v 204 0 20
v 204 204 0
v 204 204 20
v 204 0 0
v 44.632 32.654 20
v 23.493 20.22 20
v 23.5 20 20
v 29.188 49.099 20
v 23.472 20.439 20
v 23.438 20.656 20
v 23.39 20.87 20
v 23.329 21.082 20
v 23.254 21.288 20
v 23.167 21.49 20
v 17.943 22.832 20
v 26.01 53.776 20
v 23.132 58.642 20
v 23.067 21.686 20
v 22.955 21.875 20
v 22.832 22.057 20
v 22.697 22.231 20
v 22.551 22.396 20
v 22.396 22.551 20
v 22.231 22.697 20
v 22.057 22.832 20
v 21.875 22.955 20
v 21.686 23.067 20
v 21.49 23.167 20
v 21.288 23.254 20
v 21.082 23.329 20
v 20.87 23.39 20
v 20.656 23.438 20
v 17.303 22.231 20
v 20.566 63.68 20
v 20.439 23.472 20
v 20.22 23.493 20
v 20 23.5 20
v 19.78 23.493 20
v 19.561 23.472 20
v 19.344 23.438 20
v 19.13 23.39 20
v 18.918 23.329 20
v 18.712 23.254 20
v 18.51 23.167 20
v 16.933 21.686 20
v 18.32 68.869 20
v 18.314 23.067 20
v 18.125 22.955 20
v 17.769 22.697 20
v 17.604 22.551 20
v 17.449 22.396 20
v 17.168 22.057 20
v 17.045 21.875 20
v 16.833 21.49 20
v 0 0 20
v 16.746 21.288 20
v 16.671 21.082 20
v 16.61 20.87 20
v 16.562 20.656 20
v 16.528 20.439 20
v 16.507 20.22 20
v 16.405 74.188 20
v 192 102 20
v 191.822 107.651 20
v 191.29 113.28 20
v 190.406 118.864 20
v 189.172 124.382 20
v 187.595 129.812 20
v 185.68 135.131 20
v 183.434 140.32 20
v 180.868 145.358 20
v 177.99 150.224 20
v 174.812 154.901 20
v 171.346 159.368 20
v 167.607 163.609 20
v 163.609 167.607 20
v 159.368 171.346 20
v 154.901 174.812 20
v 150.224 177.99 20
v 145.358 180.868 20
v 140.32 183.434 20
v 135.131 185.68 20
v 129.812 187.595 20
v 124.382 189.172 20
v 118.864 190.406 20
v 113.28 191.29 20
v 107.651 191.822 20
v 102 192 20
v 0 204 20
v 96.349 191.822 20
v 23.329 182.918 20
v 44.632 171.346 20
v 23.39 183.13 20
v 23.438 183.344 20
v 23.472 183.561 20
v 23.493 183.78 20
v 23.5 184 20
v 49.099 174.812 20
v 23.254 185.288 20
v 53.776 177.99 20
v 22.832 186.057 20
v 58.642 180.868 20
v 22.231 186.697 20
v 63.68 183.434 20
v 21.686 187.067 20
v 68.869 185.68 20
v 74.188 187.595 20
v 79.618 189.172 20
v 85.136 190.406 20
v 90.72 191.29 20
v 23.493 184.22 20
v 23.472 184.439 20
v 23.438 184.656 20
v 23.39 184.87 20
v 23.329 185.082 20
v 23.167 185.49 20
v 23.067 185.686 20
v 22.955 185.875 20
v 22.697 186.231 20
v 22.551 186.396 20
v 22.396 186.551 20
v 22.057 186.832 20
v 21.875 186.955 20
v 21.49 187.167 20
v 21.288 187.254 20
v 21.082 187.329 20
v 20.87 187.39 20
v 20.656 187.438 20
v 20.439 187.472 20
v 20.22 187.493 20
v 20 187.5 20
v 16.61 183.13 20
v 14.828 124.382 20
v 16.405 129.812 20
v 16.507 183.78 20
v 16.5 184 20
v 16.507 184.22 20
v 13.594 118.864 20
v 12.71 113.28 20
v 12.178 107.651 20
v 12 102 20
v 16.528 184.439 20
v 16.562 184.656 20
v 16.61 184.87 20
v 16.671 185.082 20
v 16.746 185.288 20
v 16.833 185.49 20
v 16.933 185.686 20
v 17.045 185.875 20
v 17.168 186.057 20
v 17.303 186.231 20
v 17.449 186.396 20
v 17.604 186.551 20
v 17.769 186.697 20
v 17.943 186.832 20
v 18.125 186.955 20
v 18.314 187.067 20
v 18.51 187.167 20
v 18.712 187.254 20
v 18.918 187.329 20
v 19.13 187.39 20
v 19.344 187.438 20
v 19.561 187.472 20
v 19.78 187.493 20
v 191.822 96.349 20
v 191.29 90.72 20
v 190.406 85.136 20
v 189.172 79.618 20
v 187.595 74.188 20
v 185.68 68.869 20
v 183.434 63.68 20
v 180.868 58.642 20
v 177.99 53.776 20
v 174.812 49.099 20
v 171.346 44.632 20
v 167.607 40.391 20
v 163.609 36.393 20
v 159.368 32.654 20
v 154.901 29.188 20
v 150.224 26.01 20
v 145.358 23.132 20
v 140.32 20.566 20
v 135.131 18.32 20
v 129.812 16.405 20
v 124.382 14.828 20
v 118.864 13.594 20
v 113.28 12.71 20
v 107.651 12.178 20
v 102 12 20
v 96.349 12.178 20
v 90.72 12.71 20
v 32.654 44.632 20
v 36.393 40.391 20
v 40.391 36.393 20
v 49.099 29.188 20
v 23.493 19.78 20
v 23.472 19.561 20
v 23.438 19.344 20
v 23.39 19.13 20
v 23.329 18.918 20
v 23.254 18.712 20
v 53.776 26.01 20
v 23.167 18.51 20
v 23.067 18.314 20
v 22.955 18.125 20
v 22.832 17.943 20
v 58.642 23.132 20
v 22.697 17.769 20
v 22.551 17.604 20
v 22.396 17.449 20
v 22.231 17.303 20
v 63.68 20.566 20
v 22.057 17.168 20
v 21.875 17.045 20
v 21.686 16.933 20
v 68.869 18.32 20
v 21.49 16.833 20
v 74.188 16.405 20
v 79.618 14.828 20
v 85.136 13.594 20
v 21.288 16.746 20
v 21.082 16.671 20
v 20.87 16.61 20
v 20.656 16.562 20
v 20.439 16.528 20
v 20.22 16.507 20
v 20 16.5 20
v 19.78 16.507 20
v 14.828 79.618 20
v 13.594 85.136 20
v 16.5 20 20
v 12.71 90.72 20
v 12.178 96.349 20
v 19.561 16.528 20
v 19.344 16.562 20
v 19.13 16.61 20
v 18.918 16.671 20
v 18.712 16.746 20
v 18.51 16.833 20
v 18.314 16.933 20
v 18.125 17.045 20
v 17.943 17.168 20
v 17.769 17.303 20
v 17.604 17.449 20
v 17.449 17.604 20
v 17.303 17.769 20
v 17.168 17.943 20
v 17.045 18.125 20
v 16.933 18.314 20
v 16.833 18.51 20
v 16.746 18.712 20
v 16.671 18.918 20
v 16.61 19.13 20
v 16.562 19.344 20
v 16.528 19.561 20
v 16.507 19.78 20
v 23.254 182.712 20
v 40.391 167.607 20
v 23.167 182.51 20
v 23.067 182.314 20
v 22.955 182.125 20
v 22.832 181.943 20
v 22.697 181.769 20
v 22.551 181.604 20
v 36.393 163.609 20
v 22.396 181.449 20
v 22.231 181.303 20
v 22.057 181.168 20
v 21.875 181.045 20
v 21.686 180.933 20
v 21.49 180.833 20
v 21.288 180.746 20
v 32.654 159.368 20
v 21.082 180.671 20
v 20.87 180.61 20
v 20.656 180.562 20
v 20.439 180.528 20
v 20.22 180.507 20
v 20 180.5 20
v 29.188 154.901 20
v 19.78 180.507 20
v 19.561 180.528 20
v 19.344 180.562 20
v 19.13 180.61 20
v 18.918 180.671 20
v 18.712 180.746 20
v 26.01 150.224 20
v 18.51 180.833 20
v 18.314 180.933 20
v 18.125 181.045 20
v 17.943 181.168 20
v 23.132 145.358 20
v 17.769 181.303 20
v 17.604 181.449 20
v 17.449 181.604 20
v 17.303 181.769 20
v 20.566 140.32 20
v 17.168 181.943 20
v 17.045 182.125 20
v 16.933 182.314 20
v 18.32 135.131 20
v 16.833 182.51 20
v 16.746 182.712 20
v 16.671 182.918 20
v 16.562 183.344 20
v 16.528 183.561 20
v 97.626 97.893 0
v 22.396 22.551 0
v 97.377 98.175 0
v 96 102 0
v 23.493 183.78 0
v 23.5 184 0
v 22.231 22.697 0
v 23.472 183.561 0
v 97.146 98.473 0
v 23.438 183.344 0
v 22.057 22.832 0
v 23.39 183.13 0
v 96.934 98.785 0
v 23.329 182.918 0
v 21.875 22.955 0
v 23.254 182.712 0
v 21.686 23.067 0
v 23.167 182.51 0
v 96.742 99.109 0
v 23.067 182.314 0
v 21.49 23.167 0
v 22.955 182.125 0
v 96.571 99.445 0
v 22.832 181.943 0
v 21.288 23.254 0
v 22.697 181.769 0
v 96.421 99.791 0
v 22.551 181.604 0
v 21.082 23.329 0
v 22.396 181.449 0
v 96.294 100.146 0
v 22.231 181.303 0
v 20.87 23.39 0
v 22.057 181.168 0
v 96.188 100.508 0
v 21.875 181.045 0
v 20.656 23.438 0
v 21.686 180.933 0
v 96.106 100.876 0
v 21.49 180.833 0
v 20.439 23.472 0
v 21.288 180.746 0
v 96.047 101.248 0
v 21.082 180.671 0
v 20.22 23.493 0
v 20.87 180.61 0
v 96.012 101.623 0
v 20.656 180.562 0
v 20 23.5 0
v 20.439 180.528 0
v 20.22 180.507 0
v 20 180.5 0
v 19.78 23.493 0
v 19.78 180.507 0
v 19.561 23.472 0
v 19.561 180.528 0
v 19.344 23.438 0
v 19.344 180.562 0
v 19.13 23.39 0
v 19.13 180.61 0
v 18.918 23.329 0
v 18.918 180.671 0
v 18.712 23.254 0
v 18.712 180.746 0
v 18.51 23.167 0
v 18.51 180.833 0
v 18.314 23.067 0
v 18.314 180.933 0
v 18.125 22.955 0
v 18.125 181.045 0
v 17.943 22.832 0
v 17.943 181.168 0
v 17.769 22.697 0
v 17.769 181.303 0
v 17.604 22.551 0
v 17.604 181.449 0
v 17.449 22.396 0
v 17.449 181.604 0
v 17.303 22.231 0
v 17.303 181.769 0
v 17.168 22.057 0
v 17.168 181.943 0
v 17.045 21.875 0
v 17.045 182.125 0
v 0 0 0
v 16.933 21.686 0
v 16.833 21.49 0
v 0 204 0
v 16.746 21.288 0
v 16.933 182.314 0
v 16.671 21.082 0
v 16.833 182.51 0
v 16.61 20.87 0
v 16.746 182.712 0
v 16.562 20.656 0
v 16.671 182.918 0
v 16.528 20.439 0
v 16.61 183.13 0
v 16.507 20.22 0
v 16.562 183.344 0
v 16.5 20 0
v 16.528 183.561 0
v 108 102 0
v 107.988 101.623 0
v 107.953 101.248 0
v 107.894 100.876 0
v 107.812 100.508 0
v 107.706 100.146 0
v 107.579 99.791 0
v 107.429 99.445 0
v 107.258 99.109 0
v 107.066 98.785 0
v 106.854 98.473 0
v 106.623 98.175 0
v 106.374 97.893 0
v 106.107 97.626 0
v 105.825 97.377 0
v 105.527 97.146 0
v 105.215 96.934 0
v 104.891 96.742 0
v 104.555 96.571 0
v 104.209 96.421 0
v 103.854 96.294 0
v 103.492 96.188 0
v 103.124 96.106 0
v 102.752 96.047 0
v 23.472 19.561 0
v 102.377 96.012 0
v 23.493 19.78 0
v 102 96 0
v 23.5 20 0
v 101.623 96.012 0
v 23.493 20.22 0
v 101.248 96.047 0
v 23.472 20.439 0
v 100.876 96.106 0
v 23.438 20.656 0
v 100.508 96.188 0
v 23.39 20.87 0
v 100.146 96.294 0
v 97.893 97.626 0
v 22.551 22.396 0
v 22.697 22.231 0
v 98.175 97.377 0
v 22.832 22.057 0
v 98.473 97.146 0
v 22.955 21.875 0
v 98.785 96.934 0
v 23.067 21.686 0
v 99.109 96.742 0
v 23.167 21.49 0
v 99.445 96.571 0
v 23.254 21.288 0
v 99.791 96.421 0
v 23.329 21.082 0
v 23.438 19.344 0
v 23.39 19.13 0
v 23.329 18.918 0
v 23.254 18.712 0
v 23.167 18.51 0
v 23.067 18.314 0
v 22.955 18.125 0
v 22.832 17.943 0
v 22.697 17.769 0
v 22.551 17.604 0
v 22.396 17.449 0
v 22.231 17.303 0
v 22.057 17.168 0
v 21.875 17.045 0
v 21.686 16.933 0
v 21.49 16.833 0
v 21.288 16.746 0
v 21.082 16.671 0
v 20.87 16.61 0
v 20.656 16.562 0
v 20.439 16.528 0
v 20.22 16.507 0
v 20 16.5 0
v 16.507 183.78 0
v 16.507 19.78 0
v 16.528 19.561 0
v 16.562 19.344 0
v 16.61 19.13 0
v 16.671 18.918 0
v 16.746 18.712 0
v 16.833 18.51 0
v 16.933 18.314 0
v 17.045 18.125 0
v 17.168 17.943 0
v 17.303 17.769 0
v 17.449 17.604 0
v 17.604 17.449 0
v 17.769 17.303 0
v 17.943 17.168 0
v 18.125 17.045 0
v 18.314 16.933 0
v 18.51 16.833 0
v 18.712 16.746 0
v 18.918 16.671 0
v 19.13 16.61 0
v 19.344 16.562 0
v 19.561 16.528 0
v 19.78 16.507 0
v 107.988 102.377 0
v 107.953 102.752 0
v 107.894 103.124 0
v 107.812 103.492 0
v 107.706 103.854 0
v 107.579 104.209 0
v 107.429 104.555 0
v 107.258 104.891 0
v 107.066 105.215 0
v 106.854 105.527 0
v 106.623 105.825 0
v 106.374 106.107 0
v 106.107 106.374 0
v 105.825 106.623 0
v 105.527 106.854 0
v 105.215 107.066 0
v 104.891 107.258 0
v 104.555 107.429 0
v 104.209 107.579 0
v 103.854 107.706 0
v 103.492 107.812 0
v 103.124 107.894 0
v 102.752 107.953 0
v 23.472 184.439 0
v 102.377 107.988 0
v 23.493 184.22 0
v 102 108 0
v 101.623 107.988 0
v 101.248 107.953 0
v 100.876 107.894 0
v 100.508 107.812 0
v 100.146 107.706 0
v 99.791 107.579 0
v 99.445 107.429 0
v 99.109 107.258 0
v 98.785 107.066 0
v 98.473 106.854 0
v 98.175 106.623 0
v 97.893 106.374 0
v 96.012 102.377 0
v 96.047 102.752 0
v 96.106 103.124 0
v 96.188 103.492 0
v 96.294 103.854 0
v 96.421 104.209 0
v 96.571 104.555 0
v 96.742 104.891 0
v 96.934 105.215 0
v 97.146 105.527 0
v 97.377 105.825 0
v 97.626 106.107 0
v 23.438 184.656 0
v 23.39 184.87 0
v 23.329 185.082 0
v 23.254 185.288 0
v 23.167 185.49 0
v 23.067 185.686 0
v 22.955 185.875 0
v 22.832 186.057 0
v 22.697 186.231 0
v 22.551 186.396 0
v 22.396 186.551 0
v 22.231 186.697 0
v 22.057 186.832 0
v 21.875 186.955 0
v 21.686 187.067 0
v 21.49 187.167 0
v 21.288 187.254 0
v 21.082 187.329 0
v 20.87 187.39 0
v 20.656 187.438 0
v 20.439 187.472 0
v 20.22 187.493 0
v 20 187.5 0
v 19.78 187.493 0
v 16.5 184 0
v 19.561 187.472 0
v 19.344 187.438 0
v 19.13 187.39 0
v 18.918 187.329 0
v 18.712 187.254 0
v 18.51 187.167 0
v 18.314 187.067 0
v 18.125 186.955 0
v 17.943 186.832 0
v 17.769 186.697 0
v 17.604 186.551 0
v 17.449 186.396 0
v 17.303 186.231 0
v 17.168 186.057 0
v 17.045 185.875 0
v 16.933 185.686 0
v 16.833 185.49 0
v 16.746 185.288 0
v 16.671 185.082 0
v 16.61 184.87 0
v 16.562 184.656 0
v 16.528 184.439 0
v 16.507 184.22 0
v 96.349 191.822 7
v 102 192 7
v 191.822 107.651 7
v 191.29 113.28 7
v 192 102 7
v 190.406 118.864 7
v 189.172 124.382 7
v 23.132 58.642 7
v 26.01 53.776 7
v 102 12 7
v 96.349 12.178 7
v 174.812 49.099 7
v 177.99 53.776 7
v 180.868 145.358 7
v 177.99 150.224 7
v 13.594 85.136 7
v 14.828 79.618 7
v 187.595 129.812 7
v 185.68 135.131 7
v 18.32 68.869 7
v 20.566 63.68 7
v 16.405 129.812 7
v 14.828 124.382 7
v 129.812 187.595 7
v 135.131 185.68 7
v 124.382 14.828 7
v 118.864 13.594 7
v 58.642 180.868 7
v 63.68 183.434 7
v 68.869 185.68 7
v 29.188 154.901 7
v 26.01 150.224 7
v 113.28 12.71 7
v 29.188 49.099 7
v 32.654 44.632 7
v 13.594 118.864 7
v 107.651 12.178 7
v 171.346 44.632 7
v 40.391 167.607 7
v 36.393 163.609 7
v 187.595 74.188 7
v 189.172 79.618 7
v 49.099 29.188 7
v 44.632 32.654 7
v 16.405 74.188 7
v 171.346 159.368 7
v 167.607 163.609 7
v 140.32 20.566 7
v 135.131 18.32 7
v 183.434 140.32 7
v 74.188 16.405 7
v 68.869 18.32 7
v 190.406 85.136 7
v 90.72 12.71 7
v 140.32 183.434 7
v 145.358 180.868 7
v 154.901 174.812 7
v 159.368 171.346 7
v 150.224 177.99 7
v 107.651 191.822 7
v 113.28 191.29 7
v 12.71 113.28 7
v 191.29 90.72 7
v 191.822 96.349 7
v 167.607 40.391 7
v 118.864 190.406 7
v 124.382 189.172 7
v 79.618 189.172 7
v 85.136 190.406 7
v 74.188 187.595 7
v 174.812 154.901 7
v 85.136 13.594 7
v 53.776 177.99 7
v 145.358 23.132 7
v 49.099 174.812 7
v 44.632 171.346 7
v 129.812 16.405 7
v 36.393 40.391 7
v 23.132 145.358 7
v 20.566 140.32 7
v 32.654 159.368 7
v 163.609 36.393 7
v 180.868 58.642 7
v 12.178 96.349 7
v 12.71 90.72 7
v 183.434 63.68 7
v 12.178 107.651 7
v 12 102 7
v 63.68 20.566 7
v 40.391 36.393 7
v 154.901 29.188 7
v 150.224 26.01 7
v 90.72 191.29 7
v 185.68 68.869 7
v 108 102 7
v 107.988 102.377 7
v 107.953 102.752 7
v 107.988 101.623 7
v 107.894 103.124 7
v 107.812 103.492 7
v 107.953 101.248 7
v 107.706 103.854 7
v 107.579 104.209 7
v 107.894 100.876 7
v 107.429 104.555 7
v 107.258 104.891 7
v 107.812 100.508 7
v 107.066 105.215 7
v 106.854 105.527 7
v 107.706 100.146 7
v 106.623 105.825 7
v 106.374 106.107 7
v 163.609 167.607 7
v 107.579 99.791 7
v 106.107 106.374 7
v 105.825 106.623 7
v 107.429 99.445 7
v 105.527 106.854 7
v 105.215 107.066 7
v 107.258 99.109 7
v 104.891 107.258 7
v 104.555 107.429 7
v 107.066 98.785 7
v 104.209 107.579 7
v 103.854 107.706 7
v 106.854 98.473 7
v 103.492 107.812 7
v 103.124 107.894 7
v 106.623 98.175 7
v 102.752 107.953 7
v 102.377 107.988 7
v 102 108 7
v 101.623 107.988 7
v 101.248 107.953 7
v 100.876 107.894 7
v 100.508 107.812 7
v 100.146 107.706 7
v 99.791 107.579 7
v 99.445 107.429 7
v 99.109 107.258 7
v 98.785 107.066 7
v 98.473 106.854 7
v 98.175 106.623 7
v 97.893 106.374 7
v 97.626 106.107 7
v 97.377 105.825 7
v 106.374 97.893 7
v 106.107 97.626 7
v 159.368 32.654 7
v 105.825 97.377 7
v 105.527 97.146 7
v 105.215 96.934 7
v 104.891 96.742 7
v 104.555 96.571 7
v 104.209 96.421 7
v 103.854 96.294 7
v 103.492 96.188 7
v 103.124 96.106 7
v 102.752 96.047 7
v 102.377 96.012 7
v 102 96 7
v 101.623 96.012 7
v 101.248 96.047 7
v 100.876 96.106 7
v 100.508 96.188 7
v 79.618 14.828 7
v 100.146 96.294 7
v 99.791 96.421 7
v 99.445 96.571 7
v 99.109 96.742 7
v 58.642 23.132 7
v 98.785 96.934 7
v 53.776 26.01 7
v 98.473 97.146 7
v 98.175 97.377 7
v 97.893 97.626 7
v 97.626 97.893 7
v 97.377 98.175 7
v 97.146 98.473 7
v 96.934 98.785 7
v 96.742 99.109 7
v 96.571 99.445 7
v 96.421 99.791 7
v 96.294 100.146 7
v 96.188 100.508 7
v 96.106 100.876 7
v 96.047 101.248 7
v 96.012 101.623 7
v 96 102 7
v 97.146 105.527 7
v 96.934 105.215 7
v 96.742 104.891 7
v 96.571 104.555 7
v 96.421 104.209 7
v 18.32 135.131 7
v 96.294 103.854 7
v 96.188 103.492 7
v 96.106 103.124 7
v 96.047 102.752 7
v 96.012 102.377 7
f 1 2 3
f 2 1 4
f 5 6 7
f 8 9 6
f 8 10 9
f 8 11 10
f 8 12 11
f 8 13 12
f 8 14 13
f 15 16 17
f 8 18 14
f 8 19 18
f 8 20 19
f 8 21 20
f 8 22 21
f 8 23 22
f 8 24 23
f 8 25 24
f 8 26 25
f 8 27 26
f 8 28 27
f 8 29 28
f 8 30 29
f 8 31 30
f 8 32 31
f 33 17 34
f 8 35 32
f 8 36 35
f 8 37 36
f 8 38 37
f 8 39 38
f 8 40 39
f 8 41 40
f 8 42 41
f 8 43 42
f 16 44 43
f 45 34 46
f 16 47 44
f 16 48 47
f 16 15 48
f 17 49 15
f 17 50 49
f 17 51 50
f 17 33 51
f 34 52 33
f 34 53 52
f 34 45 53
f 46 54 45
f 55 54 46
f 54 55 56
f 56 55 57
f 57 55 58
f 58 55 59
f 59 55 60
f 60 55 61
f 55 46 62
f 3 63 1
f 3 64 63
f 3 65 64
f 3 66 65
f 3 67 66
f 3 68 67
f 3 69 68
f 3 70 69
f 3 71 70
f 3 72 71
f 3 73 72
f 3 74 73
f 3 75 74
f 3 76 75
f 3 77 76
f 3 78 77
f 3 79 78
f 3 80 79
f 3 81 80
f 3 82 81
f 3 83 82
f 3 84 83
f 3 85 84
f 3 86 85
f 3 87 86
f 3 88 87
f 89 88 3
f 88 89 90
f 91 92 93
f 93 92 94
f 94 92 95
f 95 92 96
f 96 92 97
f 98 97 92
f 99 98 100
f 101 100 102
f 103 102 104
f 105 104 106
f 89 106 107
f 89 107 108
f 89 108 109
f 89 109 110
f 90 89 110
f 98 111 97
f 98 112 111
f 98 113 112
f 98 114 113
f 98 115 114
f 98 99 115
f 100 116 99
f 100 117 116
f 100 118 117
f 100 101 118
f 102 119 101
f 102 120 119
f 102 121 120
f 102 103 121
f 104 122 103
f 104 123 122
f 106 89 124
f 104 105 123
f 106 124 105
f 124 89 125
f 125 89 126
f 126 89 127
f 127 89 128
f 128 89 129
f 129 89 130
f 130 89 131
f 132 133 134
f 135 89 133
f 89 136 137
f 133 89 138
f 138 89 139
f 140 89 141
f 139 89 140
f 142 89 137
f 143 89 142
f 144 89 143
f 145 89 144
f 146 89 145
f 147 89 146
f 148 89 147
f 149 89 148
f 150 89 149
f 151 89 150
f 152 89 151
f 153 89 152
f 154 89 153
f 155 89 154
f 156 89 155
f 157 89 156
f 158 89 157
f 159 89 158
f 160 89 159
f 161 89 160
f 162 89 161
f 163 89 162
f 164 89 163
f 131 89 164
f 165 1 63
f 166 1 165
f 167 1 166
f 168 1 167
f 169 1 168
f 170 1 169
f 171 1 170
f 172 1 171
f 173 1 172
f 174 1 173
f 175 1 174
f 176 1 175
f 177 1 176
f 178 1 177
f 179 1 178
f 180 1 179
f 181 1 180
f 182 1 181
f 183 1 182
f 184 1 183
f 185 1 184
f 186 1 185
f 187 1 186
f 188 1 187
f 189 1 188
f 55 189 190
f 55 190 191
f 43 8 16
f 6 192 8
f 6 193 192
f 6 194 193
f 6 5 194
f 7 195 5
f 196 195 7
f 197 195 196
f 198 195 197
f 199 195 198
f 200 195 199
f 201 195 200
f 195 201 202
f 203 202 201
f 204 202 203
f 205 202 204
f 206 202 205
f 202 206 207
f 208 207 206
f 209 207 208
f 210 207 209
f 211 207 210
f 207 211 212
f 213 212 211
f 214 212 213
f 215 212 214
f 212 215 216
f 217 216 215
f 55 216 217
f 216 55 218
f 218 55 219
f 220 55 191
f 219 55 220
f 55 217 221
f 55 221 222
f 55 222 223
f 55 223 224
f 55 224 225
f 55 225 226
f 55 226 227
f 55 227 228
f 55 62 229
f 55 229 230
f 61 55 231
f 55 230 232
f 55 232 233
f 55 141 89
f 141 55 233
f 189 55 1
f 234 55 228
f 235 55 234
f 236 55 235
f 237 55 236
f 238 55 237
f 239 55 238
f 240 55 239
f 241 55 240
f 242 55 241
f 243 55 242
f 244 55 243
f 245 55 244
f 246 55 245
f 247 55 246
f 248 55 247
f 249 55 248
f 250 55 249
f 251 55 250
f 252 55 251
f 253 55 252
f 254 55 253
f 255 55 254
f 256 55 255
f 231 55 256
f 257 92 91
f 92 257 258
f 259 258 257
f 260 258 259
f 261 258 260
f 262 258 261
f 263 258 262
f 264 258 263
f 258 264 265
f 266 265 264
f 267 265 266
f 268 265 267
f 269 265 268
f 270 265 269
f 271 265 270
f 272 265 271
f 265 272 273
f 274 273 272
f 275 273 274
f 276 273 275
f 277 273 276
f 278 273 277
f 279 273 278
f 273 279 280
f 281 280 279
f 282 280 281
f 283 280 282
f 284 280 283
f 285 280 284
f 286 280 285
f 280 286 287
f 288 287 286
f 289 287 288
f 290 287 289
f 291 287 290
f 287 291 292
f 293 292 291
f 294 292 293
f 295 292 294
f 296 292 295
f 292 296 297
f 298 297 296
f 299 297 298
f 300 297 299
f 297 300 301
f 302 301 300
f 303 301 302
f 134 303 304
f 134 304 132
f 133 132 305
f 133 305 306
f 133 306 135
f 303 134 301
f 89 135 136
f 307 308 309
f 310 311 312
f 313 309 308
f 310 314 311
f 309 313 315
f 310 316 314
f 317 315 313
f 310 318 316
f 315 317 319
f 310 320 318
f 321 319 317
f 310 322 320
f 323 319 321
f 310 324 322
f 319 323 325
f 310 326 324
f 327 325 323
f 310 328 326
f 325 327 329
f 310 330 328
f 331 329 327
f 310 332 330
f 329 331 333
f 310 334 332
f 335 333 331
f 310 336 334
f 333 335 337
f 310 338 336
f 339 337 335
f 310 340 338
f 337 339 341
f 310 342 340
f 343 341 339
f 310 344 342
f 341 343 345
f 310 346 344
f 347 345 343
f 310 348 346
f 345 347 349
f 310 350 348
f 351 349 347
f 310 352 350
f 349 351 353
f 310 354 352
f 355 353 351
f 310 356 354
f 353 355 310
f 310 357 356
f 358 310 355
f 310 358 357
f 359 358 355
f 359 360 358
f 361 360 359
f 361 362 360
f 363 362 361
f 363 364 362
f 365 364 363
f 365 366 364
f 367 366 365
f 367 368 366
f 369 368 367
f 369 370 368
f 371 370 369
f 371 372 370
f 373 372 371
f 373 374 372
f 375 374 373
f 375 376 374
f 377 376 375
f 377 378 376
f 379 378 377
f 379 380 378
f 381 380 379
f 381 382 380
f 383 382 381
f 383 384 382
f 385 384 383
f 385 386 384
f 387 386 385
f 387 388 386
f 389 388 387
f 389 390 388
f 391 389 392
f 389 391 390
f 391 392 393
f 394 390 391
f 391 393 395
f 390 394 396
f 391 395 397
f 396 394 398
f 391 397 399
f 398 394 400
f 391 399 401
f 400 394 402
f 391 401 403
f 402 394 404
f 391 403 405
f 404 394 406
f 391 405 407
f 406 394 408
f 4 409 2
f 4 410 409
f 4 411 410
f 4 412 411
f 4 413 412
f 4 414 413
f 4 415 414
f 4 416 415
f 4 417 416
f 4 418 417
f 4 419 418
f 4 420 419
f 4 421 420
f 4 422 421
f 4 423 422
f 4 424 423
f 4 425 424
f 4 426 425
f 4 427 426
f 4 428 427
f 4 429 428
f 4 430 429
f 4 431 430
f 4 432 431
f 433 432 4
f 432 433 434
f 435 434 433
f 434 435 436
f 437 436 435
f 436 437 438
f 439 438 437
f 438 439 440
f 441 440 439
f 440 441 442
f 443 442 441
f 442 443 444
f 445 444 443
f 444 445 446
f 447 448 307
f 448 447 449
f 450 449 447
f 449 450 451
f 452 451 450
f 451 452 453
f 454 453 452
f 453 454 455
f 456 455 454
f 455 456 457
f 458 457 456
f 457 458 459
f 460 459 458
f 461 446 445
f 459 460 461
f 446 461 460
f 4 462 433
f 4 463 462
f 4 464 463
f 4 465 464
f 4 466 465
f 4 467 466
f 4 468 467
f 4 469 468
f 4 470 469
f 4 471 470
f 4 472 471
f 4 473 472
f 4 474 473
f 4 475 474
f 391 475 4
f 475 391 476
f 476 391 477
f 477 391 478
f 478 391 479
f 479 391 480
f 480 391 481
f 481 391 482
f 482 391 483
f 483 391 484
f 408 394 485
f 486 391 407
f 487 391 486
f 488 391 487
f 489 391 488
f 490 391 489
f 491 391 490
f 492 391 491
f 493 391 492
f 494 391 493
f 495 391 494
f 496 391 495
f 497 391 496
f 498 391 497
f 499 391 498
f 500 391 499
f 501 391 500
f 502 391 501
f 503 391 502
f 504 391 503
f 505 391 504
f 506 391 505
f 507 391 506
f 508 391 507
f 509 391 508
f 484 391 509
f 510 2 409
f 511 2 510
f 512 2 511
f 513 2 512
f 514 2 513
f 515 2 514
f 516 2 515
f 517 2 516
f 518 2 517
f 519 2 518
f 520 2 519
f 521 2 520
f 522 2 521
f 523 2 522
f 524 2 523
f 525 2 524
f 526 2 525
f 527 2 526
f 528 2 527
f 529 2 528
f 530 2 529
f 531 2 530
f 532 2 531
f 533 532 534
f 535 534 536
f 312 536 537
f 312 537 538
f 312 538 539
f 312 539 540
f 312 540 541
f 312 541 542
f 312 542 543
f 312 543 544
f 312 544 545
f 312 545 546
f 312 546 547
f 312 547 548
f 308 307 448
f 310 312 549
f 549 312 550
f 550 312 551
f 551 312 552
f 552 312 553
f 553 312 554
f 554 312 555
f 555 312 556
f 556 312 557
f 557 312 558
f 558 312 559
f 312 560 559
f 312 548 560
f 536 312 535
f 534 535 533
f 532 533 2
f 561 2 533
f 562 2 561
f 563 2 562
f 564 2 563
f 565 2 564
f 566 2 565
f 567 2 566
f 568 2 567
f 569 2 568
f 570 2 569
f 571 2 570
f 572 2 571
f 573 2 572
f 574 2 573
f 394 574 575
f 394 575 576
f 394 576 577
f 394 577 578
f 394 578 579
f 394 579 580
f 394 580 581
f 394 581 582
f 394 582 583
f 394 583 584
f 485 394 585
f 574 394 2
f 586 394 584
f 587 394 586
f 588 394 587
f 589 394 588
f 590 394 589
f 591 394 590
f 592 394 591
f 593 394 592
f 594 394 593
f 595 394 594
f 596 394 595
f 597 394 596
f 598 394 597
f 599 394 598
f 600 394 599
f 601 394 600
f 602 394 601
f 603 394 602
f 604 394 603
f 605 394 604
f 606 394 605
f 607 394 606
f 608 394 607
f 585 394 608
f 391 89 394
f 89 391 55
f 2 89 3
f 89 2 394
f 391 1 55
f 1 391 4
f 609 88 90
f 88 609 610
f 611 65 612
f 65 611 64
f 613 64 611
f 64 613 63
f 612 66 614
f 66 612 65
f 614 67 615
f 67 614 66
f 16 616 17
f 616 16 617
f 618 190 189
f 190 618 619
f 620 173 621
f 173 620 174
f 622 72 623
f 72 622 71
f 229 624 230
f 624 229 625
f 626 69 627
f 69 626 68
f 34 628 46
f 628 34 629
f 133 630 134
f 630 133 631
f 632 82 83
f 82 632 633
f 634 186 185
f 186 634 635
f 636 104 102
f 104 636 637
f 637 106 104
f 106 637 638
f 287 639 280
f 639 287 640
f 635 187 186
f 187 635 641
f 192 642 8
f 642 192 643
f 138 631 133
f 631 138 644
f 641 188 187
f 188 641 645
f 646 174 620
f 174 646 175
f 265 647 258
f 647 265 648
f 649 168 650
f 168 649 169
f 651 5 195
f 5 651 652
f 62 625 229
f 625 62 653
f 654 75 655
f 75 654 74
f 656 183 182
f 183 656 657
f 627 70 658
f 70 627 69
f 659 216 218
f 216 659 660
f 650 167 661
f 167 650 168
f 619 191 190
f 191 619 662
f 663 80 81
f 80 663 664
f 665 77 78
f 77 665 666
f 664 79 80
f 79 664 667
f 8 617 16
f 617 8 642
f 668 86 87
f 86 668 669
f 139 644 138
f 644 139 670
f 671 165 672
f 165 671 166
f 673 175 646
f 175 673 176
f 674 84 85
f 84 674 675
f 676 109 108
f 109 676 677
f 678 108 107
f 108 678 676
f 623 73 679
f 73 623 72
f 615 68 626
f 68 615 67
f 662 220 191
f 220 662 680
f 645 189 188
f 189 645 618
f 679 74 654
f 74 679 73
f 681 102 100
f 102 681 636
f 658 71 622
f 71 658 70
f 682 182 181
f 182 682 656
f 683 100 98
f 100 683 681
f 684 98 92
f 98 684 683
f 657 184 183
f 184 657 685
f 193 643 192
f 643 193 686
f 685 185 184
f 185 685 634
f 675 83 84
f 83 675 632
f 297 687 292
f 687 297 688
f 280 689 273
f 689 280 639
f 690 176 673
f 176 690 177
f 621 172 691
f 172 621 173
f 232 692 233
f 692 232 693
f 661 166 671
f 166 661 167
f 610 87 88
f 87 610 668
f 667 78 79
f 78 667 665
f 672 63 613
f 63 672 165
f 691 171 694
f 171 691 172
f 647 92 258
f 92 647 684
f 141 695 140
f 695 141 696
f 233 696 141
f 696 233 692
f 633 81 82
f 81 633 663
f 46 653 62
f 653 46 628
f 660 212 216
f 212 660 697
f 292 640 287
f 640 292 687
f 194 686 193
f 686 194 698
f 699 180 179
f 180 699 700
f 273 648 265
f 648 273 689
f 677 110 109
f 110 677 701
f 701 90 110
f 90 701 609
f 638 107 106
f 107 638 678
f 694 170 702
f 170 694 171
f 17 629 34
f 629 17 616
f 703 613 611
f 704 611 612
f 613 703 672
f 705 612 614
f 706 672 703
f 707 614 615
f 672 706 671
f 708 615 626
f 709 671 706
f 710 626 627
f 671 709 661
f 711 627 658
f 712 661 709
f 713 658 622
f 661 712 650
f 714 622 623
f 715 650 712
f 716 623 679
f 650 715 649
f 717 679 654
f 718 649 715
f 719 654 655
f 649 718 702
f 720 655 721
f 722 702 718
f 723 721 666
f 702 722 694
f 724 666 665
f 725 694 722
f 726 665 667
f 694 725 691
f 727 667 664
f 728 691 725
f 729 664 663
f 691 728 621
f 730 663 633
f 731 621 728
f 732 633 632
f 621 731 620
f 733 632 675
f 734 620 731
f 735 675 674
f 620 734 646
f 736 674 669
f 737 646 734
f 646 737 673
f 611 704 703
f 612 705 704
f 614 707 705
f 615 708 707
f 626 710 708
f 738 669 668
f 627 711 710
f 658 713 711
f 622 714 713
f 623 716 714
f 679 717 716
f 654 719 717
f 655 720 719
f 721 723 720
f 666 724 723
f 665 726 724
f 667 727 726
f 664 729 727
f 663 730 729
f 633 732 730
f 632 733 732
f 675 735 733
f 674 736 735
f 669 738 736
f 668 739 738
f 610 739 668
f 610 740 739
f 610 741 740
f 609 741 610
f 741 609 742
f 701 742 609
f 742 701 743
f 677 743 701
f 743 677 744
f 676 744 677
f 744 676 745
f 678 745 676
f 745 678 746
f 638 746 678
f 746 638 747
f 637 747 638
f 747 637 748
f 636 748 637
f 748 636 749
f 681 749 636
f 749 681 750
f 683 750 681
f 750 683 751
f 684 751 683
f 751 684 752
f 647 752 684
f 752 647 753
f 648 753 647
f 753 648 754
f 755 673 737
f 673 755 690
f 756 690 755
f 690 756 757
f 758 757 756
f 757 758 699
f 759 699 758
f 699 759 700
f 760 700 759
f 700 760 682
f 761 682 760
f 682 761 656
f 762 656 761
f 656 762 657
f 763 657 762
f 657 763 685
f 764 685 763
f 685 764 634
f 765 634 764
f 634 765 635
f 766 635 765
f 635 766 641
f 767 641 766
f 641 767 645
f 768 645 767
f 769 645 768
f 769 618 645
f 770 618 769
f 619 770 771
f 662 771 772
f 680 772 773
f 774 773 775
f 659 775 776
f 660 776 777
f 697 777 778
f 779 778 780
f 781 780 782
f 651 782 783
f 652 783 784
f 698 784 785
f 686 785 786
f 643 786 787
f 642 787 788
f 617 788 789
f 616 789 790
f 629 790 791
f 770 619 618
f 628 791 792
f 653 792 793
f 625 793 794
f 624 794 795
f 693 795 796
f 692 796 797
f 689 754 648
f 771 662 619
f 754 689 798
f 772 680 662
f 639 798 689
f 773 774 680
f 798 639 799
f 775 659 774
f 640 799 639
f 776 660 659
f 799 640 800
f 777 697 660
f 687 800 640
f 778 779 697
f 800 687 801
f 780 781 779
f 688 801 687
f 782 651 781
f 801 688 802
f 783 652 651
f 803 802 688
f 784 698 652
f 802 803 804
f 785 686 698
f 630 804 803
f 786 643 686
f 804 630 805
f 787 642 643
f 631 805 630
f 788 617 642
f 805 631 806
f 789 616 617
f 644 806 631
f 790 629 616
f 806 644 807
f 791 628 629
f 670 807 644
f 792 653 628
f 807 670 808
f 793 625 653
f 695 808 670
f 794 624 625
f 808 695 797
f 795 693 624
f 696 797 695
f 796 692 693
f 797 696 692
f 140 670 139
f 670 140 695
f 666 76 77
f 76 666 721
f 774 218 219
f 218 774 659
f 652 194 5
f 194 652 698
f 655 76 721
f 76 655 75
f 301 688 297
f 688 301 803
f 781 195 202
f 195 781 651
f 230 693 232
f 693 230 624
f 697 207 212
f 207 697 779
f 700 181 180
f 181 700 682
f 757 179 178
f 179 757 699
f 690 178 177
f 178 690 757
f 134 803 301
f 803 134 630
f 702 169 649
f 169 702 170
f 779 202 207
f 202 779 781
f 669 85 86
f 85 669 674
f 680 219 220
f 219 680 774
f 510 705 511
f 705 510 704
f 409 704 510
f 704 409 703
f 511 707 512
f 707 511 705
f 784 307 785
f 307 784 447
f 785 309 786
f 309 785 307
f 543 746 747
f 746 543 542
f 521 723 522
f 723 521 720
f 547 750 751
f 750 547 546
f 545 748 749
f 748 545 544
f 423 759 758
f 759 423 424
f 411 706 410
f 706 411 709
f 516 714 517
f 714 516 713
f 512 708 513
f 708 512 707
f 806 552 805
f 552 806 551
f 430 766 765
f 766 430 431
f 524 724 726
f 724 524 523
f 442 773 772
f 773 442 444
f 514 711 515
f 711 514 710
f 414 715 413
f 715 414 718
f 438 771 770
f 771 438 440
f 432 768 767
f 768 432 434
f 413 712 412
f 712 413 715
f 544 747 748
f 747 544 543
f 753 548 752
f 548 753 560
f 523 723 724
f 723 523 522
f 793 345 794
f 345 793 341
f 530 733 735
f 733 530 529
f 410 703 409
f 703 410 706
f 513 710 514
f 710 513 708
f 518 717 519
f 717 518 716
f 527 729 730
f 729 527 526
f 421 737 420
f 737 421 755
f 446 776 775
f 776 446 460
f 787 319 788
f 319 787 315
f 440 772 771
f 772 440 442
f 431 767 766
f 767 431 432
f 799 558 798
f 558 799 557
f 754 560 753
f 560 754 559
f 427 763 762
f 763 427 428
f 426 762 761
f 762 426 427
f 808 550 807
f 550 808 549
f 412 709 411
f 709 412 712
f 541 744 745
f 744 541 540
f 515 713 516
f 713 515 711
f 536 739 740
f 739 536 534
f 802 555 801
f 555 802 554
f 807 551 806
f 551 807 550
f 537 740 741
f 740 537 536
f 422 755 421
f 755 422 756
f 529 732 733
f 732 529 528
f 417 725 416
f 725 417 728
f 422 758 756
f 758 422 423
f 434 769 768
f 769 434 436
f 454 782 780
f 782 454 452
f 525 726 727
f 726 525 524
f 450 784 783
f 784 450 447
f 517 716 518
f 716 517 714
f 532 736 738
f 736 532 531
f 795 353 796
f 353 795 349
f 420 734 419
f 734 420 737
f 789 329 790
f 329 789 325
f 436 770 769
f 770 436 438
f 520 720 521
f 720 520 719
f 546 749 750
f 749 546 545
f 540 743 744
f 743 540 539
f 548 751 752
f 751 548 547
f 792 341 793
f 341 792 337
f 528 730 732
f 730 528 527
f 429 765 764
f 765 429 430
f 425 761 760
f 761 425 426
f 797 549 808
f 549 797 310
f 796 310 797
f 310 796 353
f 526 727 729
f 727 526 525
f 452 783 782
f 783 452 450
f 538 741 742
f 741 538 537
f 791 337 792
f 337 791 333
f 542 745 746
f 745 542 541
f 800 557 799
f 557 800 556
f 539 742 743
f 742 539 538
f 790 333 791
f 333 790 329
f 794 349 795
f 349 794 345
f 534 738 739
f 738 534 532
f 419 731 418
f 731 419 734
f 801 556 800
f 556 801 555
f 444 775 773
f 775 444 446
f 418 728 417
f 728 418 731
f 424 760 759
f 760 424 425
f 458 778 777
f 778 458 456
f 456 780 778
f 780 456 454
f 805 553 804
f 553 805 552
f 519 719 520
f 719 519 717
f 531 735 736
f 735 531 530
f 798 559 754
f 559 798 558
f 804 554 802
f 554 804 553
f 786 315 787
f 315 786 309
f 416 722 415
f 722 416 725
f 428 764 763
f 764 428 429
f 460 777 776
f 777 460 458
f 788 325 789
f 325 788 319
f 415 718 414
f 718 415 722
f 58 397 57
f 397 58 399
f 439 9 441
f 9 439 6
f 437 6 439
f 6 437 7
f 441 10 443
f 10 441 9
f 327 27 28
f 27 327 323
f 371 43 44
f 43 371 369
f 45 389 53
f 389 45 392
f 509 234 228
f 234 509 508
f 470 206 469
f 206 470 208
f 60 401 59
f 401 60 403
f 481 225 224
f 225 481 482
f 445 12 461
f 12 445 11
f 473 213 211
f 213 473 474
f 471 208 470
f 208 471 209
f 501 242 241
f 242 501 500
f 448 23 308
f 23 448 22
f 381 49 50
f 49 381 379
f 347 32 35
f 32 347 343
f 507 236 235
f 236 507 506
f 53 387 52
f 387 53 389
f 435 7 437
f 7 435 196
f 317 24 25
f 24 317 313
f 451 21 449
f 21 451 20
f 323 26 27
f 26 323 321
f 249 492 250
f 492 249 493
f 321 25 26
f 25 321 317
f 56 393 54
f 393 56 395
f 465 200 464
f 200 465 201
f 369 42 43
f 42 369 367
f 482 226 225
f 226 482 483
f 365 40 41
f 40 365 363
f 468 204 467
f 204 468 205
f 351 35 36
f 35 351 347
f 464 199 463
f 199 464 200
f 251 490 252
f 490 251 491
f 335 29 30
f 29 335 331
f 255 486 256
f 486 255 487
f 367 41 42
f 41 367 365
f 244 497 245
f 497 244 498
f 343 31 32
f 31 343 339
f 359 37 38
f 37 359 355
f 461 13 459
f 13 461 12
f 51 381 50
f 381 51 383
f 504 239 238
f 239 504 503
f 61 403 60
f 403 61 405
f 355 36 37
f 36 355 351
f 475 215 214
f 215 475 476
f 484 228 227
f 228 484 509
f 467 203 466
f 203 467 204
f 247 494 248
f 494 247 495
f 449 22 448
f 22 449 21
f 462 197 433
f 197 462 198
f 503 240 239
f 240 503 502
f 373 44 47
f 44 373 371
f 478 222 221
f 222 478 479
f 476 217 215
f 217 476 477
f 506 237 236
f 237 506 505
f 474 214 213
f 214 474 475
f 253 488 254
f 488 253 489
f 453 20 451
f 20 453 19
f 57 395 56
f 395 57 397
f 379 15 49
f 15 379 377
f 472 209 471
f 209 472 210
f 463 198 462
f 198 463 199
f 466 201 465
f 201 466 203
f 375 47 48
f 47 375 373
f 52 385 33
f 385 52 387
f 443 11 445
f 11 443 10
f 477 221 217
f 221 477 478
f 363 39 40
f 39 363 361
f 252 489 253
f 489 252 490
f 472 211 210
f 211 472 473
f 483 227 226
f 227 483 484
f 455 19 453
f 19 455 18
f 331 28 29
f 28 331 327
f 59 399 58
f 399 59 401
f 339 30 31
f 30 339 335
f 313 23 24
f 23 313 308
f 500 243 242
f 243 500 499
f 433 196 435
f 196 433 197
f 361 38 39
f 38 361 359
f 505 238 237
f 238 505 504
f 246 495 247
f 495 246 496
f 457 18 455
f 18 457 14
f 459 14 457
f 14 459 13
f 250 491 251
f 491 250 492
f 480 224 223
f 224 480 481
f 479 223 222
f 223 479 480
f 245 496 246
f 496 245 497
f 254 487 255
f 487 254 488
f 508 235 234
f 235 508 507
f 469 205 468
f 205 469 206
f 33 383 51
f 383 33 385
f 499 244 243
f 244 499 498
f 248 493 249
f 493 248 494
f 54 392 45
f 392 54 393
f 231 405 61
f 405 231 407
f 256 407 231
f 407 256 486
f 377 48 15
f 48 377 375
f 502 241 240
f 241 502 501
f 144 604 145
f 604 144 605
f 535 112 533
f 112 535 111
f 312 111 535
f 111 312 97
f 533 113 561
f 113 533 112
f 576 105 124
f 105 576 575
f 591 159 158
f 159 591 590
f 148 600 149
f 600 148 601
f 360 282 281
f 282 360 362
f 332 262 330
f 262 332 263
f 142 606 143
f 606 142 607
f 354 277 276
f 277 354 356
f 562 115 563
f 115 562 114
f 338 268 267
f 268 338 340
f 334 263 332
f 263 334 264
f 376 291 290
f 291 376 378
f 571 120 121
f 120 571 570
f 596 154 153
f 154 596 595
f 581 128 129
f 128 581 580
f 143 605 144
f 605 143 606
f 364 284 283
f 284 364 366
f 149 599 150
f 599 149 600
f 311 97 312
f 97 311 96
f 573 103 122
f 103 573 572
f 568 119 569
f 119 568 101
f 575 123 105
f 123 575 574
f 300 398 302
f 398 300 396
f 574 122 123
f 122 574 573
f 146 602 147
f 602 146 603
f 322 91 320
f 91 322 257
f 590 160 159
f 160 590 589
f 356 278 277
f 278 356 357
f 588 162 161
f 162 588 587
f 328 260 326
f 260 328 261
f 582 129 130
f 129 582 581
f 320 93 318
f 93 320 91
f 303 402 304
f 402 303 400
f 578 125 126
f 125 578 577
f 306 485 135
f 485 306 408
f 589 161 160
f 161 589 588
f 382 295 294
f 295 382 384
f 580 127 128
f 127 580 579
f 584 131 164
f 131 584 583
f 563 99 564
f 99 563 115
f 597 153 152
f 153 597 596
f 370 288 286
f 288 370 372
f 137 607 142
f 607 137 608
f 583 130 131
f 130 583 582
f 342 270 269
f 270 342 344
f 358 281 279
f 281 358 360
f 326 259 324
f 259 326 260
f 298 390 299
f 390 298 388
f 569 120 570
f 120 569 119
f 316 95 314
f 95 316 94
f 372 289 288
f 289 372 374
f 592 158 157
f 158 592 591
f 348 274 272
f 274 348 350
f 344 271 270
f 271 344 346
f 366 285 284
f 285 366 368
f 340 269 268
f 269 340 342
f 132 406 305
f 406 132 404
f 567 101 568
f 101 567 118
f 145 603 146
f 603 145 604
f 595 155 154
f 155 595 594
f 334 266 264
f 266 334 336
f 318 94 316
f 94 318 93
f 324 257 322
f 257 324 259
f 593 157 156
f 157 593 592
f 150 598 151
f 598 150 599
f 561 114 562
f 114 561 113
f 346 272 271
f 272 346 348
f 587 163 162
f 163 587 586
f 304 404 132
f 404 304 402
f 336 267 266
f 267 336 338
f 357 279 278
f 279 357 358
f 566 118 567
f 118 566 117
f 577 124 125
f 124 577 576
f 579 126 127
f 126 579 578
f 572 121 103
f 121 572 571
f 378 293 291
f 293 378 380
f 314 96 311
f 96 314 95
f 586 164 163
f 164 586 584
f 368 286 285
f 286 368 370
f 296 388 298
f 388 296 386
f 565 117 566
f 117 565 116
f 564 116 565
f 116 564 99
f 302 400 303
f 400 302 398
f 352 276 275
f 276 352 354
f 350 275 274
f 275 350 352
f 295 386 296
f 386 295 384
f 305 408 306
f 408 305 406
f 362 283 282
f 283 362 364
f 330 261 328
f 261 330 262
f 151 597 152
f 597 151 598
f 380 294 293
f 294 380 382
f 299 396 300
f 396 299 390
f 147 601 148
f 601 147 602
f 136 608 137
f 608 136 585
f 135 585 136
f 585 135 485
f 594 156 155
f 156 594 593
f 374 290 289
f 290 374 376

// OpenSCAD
ringDia = 180;
ringPad = 12;
cableDia = 12;

width = ringDia + (ringPad * 2);
thick = 20;
inset=7;
holeDia = 7;
holeInset = 20;


difference() {

         // Outer edge
        cube([width,width,thick]);
        
    translate([(width/2), (width/2), inset])
    cylinder(h=(thick - inset), d=ringDia, $fn=100);

    translate([(width/2), (width/2), 0])
    cylinder(h=(thick), d=cableDia, $fn=100);
    
         union() {
                translate([holeInset, holeInset, 0])
                cylinder(h=thick+10, d=holeDia, $fn=100);
            }

            union() {
                translate([holeInset, width - holeInset, 0])
                cylinder(h=thick+10, d=holeDia, $fn=100);
            }      
           
     };
